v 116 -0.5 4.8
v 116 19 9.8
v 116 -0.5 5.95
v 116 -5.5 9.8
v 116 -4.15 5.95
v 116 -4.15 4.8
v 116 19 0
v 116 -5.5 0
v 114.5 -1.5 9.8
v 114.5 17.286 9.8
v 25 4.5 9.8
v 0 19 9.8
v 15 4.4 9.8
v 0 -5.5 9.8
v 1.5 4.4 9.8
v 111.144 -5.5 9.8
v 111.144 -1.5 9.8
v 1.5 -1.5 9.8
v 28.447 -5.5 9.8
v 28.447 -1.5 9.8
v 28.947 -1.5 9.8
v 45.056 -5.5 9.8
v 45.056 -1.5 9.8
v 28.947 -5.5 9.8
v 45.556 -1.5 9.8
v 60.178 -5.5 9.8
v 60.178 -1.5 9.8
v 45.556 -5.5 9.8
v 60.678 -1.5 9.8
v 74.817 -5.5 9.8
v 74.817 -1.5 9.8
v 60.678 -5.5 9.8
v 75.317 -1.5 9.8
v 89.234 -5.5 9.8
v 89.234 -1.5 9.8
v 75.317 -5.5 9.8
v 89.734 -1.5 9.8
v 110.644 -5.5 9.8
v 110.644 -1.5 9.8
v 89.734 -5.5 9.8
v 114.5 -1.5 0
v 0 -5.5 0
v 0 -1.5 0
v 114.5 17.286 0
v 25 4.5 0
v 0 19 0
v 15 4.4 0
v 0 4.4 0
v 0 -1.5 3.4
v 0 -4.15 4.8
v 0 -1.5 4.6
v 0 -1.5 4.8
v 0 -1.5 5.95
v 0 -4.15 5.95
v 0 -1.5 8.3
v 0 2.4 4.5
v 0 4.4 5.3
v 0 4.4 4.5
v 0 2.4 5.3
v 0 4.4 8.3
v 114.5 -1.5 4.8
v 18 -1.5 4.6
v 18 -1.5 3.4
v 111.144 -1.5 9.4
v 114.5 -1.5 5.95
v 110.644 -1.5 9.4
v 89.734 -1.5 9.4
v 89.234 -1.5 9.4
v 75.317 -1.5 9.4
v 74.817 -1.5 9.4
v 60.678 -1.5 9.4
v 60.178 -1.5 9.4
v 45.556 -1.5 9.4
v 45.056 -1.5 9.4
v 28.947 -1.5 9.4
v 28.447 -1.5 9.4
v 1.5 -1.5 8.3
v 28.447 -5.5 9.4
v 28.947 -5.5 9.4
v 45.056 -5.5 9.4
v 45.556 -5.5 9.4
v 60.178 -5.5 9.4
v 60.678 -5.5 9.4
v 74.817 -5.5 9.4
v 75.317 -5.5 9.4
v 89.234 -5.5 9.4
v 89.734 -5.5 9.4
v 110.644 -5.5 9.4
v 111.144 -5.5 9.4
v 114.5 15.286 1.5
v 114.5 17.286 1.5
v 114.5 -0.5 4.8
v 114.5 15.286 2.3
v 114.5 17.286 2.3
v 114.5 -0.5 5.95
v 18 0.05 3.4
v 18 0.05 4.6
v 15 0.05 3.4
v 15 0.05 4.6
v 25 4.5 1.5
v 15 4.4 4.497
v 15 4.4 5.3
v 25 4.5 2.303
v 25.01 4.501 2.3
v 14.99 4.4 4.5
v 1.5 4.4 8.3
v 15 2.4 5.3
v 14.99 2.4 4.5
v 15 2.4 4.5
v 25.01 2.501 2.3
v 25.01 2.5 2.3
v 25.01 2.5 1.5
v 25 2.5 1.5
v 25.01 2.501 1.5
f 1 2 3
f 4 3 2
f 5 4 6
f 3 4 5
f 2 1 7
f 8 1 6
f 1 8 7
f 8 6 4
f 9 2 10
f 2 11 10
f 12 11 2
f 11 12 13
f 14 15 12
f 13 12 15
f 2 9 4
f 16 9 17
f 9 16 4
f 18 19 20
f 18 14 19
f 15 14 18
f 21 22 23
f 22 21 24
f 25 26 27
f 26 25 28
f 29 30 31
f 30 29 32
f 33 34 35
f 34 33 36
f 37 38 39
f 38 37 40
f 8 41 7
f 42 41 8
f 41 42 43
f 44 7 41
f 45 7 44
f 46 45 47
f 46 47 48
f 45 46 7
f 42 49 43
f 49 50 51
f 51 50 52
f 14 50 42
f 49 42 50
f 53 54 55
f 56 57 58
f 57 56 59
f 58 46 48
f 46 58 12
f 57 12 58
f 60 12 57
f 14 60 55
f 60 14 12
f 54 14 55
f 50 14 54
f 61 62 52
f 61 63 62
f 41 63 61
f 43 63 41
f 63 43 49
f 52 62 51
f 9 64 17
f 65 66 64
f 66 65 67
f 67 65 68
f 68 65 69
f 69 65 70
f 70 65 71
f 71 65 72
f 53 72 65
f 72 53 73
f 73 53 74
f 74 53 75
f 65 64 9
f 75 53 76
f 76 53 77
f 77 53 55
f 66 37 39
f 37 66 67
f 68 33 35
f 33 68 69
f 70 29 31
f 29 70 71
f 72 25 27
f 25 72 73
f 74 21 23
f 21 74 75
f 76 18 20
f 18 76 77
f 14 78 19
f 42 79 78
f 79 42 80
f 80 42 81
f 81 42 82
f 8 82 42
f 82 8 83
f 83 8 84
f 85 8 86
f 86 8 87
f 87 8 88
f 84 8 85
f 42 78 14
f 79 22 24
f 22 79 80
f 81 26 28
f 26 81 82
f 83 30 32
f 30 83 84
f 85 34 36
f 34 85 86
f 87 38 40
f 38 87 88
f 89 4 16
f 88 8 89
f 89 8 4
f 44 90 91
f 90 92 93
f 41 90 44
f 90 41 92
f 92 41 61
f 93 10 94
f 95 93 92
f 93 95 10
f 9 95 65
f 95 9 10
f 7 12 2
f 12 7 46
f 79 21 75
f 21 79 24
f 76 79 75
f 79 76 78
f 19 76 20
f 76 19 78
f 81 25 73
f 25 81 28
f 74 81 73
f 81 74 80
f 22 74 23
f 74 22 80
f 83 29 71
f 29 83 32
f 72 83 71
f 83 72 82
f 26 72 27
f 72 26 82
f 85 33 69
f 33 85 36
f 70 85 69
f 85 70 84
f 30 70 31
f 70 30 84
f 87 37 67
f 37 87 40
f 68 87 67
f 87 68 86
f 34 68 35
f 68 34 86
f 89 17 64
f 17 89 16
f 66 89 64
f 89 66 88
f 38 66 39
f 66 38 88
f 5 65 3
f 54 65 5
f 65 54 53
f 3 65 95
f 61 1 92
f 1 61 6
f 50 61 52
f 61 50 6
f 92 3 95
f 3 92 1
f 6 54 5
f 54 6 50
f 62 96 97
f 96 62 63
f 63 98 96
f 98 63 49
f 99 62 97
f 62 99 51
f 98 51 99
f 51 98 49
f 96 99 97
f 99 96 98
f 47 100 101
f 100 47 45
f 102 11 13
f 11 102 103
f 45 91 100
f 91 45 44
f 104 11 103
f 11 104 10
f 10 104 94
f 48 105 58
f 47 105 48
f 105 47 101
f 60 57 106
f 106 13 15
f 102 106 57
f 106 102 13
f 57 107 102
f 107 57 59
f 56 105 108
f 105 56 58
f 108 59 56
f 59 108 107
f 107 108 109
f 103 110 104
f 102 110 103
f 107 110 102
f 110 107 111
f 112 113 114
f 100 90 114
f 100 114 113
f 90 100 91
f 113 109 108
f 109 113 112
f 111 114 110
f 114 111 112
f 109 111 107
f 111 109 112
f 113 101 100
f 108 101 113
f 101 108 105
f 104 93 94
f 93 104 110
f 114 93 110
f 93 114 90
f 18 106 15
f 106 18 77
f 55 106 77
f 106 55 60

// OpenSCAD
// m2_lean_sieve.scad — M2 のねじを長さで分ける「寄りかかりのふるい」＋ ねじを装填する帯（2026-09-10）。
//   出発点はユーザーの言葉（2026-09-10）: 「振れば小さいのは下に落ちるでしょ？特定の長さが残るふるいを作れればそれで解決」
//   「なんで転がさないとふるいにかけられないのか。傾くから。なら整列させればいい」「摩擦を減らせばいいのなら微振動かければいい」。
//   ふるいの形は私（AI）が引いた。整列した列（頭が上）から 2mm 刻みで抜き出すのに、頭を浮かせて上で分ける形は頭 1.4 対 刻み 2.0 で窓が 0.6 しか無く閉じた。
//   開いたのは「寝かせて 2 点で支える」形: 頭を片側の縁に、軸を向かいの低い庇（lip）に寄りかからせ、庇までの距離 w を樋に沿って
//   1:7 で広げる。自分の長さで庇に届かなくなった所で、そのねじだけが落ちる。ふるいの目が「穴の径」ではなく「庇までの距離」になった物。
//
//   帯（belt）: 2026-09-10 ユーザー「銃の弾をベルトで巻くやつのイメージで、このふるいの上でネジをスライドさせるためのベルト」「間隔 6・厚み 1.0で一旦やってみよ。3つくらいでいいよ装填数」
//   「ネジは帯に圧入されていて、スリットにいれると外れるが、垂直に（立ったまま水平に）押されていくみたいな感じにしないと」:
//     帯は 2 層。下 0.5 は軸を受ける U の切り欠き（幅 2.4・奥 1.5。口の角に丸い当たりを付けて口を 1.9 に絞る＝圧入）、上 0.5 は頭を囲む半円の受け（r 2.0）。
//     頭は下の層の肩に乗り、口の絞りで軸が抜けない。手に持ったまま 3 本入る。
//     樋の入り口 15 に「外す坂」（帯の下を走る固定の肋。軸を庇側へ押して口の絞りを越えさせる）。外れた頭は帯の縁と向かいの縁に乗って垂直に吊られ、
//     上の層の受けの後ろの壁が頭を押して進む。その先で向かいの縁が庇に下がり、寄りかかって落ちる。
//     私が足した物: ①外す坂 ②縁側の壁 4.0 と深さ 2.5 の溝（帯の外側 2.5 が溝、内側 1.5 が樋の上）。縁（帯の床）は無し（軸が帯の下に出るので）
//     ③帯の長さ 130（受け 18 + 尻尾 112。尻尾を押して送る。受け 3 つ目が ×15 の線を越えるまで押せる） ④出口の壁に帯の通り穴 ⑤入り口の上の橋（左右の壁を繋ぐ）
//     圧入の当たり 0.1（口 1.9 に軸 2.0）は樹脂の弾性を見ていない私の仮の数字。
//
// 数字（📄 JIS B1111 M2 なべ: 軸 φ2.0・頭 φ3.8 × 1.4。手元の実測は無い）:
//   落ちる w（庇の深さ 3.0）: 支えは「頭の下面が帯の縁（受けの口の角 X ±1.2）に乗り、先端が庇の上面に乗る」の 2 点。
//     頭の接点は軸から 1.47（= √(1.9² − 1.2²)）なので、接点から先端までは常に √(1.47² + L²)。先端が深さ 3.0 の庇に着く横位置は √(L² + 1.47² − 3²):
//     ×4 3.03 / ×6 5.41 / ×8 7.56 / ×10 9.65 / ×12 11.71 / ×15 14.78   — 長さ 2mm 差で w が 2.1〜2.4 ずれる
//   庇の深さ 3.0 は ×4 が入り口（w 2.5）で支えられるための数字。
//   庇の幅 2.0: 庇の上の壁の面を w + 2.0 に置き、寄りかかった頭（×4 が最も立つ）が壁に当たらないように。
//   樋の全長 = 外す坂 15 + 受け渡し 10 + ふるい 91（w 2.5 → 15.5 ÷ 1/7）= 116。帯 130。Mars 3 の LCD 143.4 に入る。
//   縁側の壁の上面に、落ちる X ごとに溝 1 本（幅 0.5・深さ 0.4。2026-09-10 ユーザー「線だけ書いておいて」）。
//   微振動と樋の傾きはこの部品に無い。刷り方は未決。桶は無し（2026-09-10 ユーザー「ひとまずは桶なしで良い」）。
//
// part = "trough"（樋。使う向き） | "belt"（帯。上を上） | "belt_loaded"（帯に ×6 を 3 本装填した絵）
//      | "asm"（帯を差した姿。1 本目は帯に持たれたまま、3 本目は外れて向かいの縁に乗る） | "sec"（SEC_X の Y-Z 断面。帯は SEC_X が 3 本目の受けの中心に来る位置）
//      | "look"（×6 を w=4.0 に寄りかからせた絵）

part = "trough";
SEC_X = 0;         // "sec" の断面の位置（X）。0 = 帯に持たれている / 15 = 外れた / 35.5 = w 4.0 で寄りかかる（×6）

// ---- ねじ（📄）----
HEAD_D = 3.8; HEAD_H = 1.4; SHANK = 2.0;

// ---- 帯 ----
BELT_T   = 1.0;    // 帯の厚み（ユーザー 2026-09-10）
LOW_T    = 0.5;    // 下の層（軸の U・頭が乗る肩）
PITCH    = 6.0;    // 受けの間隔（ユーザー 2026-09-10）
N_POCKET = 3;      // 装填数（ユーザー 2026-09-10）
NOTCH_W  = 2.4;    // 軸の U の幅
NOTCH_D  = 1.5;    // 軸の U の奥（縁から）。軸の中心は縁から 0.3 内側
MOUTH_W  = 1.9;    // U の口（圧入。軸 2.0 に当たり 0.1）
BUMP_R   = (NOTCH_W - MOUTH_W) / 2;   // 0.25 口の当たり（丸）
POCKET_R = 2.0;    // 頭の受け（上の層の半円。頭 3.8 に 0.2）
SHANK_Y  = -(NOTCH_D - NOTCH_W / 2);  // -0.3 装填時の軸の中心（帯の縁を Y 0）
SLOT_D   = 2.5;    // 溝の深さ（壁の面から外へ）
BELT_IN  = 1.5;    // 帯の、壁の面から内側に出る幅
BELT_W   = SLOT_D + BELT_IN;          // 4.0
BELT_L   = 130;    // 帯の全長（受け 18 + 尻尾）
BELT_FIT = 0.15;   // 溝との見込み（厚み・幅）

// ---- 樋 ----
W0      = 2.5;     // 入り口の縁〜庇の距離
W1      = 15.5;    // 出口の縁〜庇の距離（×15 が 14.78 で落ちる）
TAPER   = 7;       // 広がり 1:7
LIP_DROP= 3.0;     // 庇の深さ（頭の座面 → 庇の上面）
LIP_W   = 2.0;     // 庇の幅（庇の縁 → 壁の面）
SLIT_W  = 2.4;     // 吊りの区間の、帯の縁から向かいの縁までの幅
LEAD_R  = 15;      // 外す坂の区間（向かいの縁は座面の高さ）
LEAD_T  = 10;      // 受け渡しの区間（向かいの縁が LIP_DROP 下がって庇になる）
SIEVE_L = (W1 - W0) * TAPER;     // 91
L_TOT   = LEAD_R + LEAD_T + SIEVE_L;  // 116
PLATE_T = 0.8;     // 庇の厚み
WALL    = 1.5;
WALL_N  = SLOT_D + 1.5;               // 4.0 縁側の壁
GUIDE_H = 4.0;
SLOT_Z  = LIP_DROP + PLATE_T + 1.5 - LOW_T;   // 4.8 溝の床（帯の下面）
SEAT_Z  = SLOT_Z + LOW_T;             // 5.3 頭の座面（帯の下の層の上面 ＝ 向かいの縁の上面）
LIP_Z   = SEAT_Z - LIP_DROP;          // 2.3 庇の上面
TOP_Z   = SLOT_Z + BELT_T + GUIDE_H;  // 9.8
Y_WALL  = -BELT_IN;                   // -1.5 縁側の壁の面（帯の縁が Y 0）
Y_NEAR  = Y_WALL - WALL_N;            // -5.5 外形（縁側）
Y_OUT   = W1 + LIP_W + WALL;          // 19.0 外形（庇側）
RAMP_Z0 = SLOT_Z - 1.4; RAMP_H = 1.2; // 外す坂の Z（帯の下 0.2 から 1.2）
RAMP_Y1 = 0.05;                       // 坂の終わりの面（軸の手前側の面がここまで来る → 軸の中心 1.05・口の当たりを越える）
MARK_W  = 0.5; MARK_D = 0.4;          // 落ちる位置の線

R_C     = sqrt((HEAD_D / 2) * (HEAD_D / 2) - (NOTCH_W / 2) * (NOTCH_W / 2));   // 1.47 頭の接点の、軸からの距離
DROP_W  = [for (L = [4, 6, 8, 10, 12, 15]) sqrt(L * L + R_C * R_C - LIP_DROP * LIP_DROP)];
function xw(w) = LEAD_R + LEAD_T + (w - W0) * TAPER;
function edge_y(x) = x <= LEAD_R ? SLIT_W
                   : x <= LEAD_R + LEAD_T ? SLIT_W + (W0 - SLIT_W) * (x - LEAD_R) / LEAD_T
                   : W0 + (x - LEAD_R - LEAD_T) / TAPER;
function face_y(x) = edge_y(x) + LIP_W;

echo(str("lean sieve  L_TOT ", L_TOT, "  drop w ", DROP_W, "  drop X ", [for (w = DROP_W) xw(w)],
         "  seat Z ", SEAT_Z, " lip Z ", LIP_Z, "  Y ", Y_NEAR, "..", Y_OUT, "  belt ", BELT_L, " x ", BELT_W, " x ", BELT_T));

module trough() {
    difference() {
        union() {
            translate([0, Y_NEAR, 0]) cube([L_TOT, WALL_N, TOP_Z]);                                   // 縁側の壁
            translate([L_TOT - WALL, Y_NEAR, 0]) cube([WALL, Y_OUT - Y_NEAR, TOP_Z]);                 // 出口の壁
        }
        for (w = DROP_W) translate([xw(w) - MARK_W / 2, Y_NEAR - 0.01, TOP_Z - MARK_D]) cube([MARK_W, WALL_N + 0.02, MARK_D + 0.01]);
        translate([-1, Y_WALL - SLOT_D - BELT_FIT, SLOT_Z]) cube([L_TOT + 2, SLOT_D + BELT_FIT + 1, BELT_T + BELT_FIT]);   // 帯の溝（全長・出口の壁も抜く）
    }
    // 外す坂: 帯の下の肋。面が Y_WALL から RAMP_Y1 へ
    translate([0, 0, RAMP_Z0]) linear_extrude(RAMP_H)
        polygon([[0, Y_WALL - 0.01], [0, Y_WALL], [LEAD_R, RAMP_Y1], [LEAD_R + 3, RAMP_Y1], [LEAD_R + 3, Y_WALL - 0.01]]);
    // 庇側の壁（面は face_y。外は Y_OUT まで詰める）
    linear_extrude(TOP_Z) polygon([[0, face_y(0)], [LEAD_R, face_y(LEAD_R)], [LEAD_R + LEAD_T, face_y(LEAD_R + LEAD_T)],
                                   [L_TOT, face_y(L_TOT)], [L_TOT, Y_OUT], [0, Y_OUT]]);
    // 向かいの縁: 外す坂の区間（座面の高さ）
    translate([0, SLIT_W, SEAT_Z - PLATE_T]) cube([LEAD_R, LIP_W + 0.01, PLATE_T]);
    // 受け渡し（座面から LIP_DROP 下がる。凸なので hull）
    hull() {
        translate([LEAD_R - 0.01, SLIT_W, SEAT_Z - PLATE_T]) cube([0.01, LIP_W + 0.01, PLATE_T]);
        translate([LEAD_R + LEAD_T, W0, LIP_Z - PLATE_T]) cube([0.01, LIP_W + 0.01, PLATE_T]);
    }
    // 庇（低い・広がる）
    translate([0, 0, LIP_Z - PLATE_T]) linear_extrude(PLATE_T)
        polygon([[LEAD_R + LEAD_T, W0], [L_TOT, W1], [L_TOT, W1 + LIP_W + 0.01], [LEAD_R + LEAD_T, W0 + LIP_W + 0.01]]);
    // 入り口の上の橋
    translate([0, Y_NEAR, TOP_Z - WALL]) cube([WALL, Y_OUT - Y_NEAR, WALL]);
}

// 帯。先端が X=0、縁が Y=0、下面 Z=0。受けの中心 X = 3, 9, 15。尻尾は -X
module belt() {
    difference() {
        translate([-(BELT_L - N_POCKET * PITCH), -BELT_W, 0]) cube([BELT_L, BELT_W, BELT_T]);
        for (i = [0 : N_POCKET - 1]) {
            xc = PITCH / 2 + i * PITCH;
            translate([xc, SHANK_Y, -1]) cylinder(d = NOTCH_W, h = LOW_T + 2, $fn = 32);                        // 下の層: 軸の U
            translate([xc - NOTCH_W / 2, SHANK_Y, -1]) cube([NOTCH_W, 1, LOW_T + 2]);
            translate([xc, SHANK_Y, LOW_T]) cylinder(r = POCKET_R, h = BELT_T, $fn = 48);                        // 上の層: 頭の受け
            translate([xc - POCKET_R, SHANK_Y, LOW_T]) cube([2 * POCKET_R, 1, BELT_T]);
        }
    }
    for (i = [0 : N_POCKET - 1], s = [-1, 1])                                                                    // 口の当たり（下の層の口の角）
        translate([PITCH / 2 + i * PITCH + s * NOTCH_W / 2, -BUMP_R, 0]) cylinder(r = BUMP_R, h = LOW_T, $fn = 16);
}
module belt_at(x0) translate([x0, 0, SLOT_Z]) belt();

module screw(L) {                       // 頭が上。頭の下面が Z=0、軸は -Z
    cylinder(d = HEAD_D, h = HEAD_H, $fn = 32);
    translate([0, 0, -L]) cylinder(d = SHANK, h = L, $fn = 24);
}
module lean6() {                        // ×6 を w=4.0 に。頭の接点（軸から 1.47）が帯の縁 (Y 0, Z SEAT_Z) に乗り、先端が庇の上面に着く。傾き θ: 1.47 cos θ − 6 sin θ = −3.0
    th = 42.8;
    translate([xw(4.0), R_C * sin(th), SEAT_Z + R_C * cos(th)]) rotate([90 - th, 0, 0]) screw(6);
}

if (part == "trough") trough();
if (part == "belt")   belt();
if (part == "belt_loaded") { color("#e0a040") belt(); color("#d05030") for (i = [0 : N_POCKET - 1]) translate([PITCH / 2 + i * PITCH, SHANK_Y, LOW_T]) screw(6); }
if (part == "asm") {                    // 帯の先端が X 15。受けの中心は X 3, 9, 15
    color("#b8c4d0") trough();
    color("#e0a040") belt_at(-3);
    color("#d05030") translate([-3 + PITCH / 2, SHANK_Y, SEAT_Z]) screw(6);                             // 1 本目（X 0）: 帯に持たれたまま（坂の手前）
    color("#d05030") translate([-3 + PITCH / 2 + 2 * PITCH, RAMP_Y1 + SHANK / 2, SEAT_Z]) screw(6);    // 3 本目（X 12）: 坂で外れた
}
if (part == "sec") projection(cut = true) rotate([-90, 0, 0]) rotate([0, 0, -90]) translate([-SEC_X, 0, 0])
    union() {
        trough();
        belt_at(SEC_X - PITCH / 2 - 2 * PITCH);                                                        // 3 本目の受けの中心が SEC_X
        if (SEC_X <= 0.01) translate([SEC_X, SHANK_Y, SEAT_Z]) screw(6);
        else if (SEC_X <= LEAD_R + 0.01) translate([SEC_X, RAMP_Y1 + SHANK / 2, SEAT_Z]) screw(6);
        else if (abs(SEC_X - xw(4.0)) < 0.1) lean6();
    }
if (part == "look") { color("#b8c4d0") trough(); color("#e0a040") belt_at(xw(4.0) - PITCH / 2 - 2 * PITCH); color("#d05030") lean6(); }
